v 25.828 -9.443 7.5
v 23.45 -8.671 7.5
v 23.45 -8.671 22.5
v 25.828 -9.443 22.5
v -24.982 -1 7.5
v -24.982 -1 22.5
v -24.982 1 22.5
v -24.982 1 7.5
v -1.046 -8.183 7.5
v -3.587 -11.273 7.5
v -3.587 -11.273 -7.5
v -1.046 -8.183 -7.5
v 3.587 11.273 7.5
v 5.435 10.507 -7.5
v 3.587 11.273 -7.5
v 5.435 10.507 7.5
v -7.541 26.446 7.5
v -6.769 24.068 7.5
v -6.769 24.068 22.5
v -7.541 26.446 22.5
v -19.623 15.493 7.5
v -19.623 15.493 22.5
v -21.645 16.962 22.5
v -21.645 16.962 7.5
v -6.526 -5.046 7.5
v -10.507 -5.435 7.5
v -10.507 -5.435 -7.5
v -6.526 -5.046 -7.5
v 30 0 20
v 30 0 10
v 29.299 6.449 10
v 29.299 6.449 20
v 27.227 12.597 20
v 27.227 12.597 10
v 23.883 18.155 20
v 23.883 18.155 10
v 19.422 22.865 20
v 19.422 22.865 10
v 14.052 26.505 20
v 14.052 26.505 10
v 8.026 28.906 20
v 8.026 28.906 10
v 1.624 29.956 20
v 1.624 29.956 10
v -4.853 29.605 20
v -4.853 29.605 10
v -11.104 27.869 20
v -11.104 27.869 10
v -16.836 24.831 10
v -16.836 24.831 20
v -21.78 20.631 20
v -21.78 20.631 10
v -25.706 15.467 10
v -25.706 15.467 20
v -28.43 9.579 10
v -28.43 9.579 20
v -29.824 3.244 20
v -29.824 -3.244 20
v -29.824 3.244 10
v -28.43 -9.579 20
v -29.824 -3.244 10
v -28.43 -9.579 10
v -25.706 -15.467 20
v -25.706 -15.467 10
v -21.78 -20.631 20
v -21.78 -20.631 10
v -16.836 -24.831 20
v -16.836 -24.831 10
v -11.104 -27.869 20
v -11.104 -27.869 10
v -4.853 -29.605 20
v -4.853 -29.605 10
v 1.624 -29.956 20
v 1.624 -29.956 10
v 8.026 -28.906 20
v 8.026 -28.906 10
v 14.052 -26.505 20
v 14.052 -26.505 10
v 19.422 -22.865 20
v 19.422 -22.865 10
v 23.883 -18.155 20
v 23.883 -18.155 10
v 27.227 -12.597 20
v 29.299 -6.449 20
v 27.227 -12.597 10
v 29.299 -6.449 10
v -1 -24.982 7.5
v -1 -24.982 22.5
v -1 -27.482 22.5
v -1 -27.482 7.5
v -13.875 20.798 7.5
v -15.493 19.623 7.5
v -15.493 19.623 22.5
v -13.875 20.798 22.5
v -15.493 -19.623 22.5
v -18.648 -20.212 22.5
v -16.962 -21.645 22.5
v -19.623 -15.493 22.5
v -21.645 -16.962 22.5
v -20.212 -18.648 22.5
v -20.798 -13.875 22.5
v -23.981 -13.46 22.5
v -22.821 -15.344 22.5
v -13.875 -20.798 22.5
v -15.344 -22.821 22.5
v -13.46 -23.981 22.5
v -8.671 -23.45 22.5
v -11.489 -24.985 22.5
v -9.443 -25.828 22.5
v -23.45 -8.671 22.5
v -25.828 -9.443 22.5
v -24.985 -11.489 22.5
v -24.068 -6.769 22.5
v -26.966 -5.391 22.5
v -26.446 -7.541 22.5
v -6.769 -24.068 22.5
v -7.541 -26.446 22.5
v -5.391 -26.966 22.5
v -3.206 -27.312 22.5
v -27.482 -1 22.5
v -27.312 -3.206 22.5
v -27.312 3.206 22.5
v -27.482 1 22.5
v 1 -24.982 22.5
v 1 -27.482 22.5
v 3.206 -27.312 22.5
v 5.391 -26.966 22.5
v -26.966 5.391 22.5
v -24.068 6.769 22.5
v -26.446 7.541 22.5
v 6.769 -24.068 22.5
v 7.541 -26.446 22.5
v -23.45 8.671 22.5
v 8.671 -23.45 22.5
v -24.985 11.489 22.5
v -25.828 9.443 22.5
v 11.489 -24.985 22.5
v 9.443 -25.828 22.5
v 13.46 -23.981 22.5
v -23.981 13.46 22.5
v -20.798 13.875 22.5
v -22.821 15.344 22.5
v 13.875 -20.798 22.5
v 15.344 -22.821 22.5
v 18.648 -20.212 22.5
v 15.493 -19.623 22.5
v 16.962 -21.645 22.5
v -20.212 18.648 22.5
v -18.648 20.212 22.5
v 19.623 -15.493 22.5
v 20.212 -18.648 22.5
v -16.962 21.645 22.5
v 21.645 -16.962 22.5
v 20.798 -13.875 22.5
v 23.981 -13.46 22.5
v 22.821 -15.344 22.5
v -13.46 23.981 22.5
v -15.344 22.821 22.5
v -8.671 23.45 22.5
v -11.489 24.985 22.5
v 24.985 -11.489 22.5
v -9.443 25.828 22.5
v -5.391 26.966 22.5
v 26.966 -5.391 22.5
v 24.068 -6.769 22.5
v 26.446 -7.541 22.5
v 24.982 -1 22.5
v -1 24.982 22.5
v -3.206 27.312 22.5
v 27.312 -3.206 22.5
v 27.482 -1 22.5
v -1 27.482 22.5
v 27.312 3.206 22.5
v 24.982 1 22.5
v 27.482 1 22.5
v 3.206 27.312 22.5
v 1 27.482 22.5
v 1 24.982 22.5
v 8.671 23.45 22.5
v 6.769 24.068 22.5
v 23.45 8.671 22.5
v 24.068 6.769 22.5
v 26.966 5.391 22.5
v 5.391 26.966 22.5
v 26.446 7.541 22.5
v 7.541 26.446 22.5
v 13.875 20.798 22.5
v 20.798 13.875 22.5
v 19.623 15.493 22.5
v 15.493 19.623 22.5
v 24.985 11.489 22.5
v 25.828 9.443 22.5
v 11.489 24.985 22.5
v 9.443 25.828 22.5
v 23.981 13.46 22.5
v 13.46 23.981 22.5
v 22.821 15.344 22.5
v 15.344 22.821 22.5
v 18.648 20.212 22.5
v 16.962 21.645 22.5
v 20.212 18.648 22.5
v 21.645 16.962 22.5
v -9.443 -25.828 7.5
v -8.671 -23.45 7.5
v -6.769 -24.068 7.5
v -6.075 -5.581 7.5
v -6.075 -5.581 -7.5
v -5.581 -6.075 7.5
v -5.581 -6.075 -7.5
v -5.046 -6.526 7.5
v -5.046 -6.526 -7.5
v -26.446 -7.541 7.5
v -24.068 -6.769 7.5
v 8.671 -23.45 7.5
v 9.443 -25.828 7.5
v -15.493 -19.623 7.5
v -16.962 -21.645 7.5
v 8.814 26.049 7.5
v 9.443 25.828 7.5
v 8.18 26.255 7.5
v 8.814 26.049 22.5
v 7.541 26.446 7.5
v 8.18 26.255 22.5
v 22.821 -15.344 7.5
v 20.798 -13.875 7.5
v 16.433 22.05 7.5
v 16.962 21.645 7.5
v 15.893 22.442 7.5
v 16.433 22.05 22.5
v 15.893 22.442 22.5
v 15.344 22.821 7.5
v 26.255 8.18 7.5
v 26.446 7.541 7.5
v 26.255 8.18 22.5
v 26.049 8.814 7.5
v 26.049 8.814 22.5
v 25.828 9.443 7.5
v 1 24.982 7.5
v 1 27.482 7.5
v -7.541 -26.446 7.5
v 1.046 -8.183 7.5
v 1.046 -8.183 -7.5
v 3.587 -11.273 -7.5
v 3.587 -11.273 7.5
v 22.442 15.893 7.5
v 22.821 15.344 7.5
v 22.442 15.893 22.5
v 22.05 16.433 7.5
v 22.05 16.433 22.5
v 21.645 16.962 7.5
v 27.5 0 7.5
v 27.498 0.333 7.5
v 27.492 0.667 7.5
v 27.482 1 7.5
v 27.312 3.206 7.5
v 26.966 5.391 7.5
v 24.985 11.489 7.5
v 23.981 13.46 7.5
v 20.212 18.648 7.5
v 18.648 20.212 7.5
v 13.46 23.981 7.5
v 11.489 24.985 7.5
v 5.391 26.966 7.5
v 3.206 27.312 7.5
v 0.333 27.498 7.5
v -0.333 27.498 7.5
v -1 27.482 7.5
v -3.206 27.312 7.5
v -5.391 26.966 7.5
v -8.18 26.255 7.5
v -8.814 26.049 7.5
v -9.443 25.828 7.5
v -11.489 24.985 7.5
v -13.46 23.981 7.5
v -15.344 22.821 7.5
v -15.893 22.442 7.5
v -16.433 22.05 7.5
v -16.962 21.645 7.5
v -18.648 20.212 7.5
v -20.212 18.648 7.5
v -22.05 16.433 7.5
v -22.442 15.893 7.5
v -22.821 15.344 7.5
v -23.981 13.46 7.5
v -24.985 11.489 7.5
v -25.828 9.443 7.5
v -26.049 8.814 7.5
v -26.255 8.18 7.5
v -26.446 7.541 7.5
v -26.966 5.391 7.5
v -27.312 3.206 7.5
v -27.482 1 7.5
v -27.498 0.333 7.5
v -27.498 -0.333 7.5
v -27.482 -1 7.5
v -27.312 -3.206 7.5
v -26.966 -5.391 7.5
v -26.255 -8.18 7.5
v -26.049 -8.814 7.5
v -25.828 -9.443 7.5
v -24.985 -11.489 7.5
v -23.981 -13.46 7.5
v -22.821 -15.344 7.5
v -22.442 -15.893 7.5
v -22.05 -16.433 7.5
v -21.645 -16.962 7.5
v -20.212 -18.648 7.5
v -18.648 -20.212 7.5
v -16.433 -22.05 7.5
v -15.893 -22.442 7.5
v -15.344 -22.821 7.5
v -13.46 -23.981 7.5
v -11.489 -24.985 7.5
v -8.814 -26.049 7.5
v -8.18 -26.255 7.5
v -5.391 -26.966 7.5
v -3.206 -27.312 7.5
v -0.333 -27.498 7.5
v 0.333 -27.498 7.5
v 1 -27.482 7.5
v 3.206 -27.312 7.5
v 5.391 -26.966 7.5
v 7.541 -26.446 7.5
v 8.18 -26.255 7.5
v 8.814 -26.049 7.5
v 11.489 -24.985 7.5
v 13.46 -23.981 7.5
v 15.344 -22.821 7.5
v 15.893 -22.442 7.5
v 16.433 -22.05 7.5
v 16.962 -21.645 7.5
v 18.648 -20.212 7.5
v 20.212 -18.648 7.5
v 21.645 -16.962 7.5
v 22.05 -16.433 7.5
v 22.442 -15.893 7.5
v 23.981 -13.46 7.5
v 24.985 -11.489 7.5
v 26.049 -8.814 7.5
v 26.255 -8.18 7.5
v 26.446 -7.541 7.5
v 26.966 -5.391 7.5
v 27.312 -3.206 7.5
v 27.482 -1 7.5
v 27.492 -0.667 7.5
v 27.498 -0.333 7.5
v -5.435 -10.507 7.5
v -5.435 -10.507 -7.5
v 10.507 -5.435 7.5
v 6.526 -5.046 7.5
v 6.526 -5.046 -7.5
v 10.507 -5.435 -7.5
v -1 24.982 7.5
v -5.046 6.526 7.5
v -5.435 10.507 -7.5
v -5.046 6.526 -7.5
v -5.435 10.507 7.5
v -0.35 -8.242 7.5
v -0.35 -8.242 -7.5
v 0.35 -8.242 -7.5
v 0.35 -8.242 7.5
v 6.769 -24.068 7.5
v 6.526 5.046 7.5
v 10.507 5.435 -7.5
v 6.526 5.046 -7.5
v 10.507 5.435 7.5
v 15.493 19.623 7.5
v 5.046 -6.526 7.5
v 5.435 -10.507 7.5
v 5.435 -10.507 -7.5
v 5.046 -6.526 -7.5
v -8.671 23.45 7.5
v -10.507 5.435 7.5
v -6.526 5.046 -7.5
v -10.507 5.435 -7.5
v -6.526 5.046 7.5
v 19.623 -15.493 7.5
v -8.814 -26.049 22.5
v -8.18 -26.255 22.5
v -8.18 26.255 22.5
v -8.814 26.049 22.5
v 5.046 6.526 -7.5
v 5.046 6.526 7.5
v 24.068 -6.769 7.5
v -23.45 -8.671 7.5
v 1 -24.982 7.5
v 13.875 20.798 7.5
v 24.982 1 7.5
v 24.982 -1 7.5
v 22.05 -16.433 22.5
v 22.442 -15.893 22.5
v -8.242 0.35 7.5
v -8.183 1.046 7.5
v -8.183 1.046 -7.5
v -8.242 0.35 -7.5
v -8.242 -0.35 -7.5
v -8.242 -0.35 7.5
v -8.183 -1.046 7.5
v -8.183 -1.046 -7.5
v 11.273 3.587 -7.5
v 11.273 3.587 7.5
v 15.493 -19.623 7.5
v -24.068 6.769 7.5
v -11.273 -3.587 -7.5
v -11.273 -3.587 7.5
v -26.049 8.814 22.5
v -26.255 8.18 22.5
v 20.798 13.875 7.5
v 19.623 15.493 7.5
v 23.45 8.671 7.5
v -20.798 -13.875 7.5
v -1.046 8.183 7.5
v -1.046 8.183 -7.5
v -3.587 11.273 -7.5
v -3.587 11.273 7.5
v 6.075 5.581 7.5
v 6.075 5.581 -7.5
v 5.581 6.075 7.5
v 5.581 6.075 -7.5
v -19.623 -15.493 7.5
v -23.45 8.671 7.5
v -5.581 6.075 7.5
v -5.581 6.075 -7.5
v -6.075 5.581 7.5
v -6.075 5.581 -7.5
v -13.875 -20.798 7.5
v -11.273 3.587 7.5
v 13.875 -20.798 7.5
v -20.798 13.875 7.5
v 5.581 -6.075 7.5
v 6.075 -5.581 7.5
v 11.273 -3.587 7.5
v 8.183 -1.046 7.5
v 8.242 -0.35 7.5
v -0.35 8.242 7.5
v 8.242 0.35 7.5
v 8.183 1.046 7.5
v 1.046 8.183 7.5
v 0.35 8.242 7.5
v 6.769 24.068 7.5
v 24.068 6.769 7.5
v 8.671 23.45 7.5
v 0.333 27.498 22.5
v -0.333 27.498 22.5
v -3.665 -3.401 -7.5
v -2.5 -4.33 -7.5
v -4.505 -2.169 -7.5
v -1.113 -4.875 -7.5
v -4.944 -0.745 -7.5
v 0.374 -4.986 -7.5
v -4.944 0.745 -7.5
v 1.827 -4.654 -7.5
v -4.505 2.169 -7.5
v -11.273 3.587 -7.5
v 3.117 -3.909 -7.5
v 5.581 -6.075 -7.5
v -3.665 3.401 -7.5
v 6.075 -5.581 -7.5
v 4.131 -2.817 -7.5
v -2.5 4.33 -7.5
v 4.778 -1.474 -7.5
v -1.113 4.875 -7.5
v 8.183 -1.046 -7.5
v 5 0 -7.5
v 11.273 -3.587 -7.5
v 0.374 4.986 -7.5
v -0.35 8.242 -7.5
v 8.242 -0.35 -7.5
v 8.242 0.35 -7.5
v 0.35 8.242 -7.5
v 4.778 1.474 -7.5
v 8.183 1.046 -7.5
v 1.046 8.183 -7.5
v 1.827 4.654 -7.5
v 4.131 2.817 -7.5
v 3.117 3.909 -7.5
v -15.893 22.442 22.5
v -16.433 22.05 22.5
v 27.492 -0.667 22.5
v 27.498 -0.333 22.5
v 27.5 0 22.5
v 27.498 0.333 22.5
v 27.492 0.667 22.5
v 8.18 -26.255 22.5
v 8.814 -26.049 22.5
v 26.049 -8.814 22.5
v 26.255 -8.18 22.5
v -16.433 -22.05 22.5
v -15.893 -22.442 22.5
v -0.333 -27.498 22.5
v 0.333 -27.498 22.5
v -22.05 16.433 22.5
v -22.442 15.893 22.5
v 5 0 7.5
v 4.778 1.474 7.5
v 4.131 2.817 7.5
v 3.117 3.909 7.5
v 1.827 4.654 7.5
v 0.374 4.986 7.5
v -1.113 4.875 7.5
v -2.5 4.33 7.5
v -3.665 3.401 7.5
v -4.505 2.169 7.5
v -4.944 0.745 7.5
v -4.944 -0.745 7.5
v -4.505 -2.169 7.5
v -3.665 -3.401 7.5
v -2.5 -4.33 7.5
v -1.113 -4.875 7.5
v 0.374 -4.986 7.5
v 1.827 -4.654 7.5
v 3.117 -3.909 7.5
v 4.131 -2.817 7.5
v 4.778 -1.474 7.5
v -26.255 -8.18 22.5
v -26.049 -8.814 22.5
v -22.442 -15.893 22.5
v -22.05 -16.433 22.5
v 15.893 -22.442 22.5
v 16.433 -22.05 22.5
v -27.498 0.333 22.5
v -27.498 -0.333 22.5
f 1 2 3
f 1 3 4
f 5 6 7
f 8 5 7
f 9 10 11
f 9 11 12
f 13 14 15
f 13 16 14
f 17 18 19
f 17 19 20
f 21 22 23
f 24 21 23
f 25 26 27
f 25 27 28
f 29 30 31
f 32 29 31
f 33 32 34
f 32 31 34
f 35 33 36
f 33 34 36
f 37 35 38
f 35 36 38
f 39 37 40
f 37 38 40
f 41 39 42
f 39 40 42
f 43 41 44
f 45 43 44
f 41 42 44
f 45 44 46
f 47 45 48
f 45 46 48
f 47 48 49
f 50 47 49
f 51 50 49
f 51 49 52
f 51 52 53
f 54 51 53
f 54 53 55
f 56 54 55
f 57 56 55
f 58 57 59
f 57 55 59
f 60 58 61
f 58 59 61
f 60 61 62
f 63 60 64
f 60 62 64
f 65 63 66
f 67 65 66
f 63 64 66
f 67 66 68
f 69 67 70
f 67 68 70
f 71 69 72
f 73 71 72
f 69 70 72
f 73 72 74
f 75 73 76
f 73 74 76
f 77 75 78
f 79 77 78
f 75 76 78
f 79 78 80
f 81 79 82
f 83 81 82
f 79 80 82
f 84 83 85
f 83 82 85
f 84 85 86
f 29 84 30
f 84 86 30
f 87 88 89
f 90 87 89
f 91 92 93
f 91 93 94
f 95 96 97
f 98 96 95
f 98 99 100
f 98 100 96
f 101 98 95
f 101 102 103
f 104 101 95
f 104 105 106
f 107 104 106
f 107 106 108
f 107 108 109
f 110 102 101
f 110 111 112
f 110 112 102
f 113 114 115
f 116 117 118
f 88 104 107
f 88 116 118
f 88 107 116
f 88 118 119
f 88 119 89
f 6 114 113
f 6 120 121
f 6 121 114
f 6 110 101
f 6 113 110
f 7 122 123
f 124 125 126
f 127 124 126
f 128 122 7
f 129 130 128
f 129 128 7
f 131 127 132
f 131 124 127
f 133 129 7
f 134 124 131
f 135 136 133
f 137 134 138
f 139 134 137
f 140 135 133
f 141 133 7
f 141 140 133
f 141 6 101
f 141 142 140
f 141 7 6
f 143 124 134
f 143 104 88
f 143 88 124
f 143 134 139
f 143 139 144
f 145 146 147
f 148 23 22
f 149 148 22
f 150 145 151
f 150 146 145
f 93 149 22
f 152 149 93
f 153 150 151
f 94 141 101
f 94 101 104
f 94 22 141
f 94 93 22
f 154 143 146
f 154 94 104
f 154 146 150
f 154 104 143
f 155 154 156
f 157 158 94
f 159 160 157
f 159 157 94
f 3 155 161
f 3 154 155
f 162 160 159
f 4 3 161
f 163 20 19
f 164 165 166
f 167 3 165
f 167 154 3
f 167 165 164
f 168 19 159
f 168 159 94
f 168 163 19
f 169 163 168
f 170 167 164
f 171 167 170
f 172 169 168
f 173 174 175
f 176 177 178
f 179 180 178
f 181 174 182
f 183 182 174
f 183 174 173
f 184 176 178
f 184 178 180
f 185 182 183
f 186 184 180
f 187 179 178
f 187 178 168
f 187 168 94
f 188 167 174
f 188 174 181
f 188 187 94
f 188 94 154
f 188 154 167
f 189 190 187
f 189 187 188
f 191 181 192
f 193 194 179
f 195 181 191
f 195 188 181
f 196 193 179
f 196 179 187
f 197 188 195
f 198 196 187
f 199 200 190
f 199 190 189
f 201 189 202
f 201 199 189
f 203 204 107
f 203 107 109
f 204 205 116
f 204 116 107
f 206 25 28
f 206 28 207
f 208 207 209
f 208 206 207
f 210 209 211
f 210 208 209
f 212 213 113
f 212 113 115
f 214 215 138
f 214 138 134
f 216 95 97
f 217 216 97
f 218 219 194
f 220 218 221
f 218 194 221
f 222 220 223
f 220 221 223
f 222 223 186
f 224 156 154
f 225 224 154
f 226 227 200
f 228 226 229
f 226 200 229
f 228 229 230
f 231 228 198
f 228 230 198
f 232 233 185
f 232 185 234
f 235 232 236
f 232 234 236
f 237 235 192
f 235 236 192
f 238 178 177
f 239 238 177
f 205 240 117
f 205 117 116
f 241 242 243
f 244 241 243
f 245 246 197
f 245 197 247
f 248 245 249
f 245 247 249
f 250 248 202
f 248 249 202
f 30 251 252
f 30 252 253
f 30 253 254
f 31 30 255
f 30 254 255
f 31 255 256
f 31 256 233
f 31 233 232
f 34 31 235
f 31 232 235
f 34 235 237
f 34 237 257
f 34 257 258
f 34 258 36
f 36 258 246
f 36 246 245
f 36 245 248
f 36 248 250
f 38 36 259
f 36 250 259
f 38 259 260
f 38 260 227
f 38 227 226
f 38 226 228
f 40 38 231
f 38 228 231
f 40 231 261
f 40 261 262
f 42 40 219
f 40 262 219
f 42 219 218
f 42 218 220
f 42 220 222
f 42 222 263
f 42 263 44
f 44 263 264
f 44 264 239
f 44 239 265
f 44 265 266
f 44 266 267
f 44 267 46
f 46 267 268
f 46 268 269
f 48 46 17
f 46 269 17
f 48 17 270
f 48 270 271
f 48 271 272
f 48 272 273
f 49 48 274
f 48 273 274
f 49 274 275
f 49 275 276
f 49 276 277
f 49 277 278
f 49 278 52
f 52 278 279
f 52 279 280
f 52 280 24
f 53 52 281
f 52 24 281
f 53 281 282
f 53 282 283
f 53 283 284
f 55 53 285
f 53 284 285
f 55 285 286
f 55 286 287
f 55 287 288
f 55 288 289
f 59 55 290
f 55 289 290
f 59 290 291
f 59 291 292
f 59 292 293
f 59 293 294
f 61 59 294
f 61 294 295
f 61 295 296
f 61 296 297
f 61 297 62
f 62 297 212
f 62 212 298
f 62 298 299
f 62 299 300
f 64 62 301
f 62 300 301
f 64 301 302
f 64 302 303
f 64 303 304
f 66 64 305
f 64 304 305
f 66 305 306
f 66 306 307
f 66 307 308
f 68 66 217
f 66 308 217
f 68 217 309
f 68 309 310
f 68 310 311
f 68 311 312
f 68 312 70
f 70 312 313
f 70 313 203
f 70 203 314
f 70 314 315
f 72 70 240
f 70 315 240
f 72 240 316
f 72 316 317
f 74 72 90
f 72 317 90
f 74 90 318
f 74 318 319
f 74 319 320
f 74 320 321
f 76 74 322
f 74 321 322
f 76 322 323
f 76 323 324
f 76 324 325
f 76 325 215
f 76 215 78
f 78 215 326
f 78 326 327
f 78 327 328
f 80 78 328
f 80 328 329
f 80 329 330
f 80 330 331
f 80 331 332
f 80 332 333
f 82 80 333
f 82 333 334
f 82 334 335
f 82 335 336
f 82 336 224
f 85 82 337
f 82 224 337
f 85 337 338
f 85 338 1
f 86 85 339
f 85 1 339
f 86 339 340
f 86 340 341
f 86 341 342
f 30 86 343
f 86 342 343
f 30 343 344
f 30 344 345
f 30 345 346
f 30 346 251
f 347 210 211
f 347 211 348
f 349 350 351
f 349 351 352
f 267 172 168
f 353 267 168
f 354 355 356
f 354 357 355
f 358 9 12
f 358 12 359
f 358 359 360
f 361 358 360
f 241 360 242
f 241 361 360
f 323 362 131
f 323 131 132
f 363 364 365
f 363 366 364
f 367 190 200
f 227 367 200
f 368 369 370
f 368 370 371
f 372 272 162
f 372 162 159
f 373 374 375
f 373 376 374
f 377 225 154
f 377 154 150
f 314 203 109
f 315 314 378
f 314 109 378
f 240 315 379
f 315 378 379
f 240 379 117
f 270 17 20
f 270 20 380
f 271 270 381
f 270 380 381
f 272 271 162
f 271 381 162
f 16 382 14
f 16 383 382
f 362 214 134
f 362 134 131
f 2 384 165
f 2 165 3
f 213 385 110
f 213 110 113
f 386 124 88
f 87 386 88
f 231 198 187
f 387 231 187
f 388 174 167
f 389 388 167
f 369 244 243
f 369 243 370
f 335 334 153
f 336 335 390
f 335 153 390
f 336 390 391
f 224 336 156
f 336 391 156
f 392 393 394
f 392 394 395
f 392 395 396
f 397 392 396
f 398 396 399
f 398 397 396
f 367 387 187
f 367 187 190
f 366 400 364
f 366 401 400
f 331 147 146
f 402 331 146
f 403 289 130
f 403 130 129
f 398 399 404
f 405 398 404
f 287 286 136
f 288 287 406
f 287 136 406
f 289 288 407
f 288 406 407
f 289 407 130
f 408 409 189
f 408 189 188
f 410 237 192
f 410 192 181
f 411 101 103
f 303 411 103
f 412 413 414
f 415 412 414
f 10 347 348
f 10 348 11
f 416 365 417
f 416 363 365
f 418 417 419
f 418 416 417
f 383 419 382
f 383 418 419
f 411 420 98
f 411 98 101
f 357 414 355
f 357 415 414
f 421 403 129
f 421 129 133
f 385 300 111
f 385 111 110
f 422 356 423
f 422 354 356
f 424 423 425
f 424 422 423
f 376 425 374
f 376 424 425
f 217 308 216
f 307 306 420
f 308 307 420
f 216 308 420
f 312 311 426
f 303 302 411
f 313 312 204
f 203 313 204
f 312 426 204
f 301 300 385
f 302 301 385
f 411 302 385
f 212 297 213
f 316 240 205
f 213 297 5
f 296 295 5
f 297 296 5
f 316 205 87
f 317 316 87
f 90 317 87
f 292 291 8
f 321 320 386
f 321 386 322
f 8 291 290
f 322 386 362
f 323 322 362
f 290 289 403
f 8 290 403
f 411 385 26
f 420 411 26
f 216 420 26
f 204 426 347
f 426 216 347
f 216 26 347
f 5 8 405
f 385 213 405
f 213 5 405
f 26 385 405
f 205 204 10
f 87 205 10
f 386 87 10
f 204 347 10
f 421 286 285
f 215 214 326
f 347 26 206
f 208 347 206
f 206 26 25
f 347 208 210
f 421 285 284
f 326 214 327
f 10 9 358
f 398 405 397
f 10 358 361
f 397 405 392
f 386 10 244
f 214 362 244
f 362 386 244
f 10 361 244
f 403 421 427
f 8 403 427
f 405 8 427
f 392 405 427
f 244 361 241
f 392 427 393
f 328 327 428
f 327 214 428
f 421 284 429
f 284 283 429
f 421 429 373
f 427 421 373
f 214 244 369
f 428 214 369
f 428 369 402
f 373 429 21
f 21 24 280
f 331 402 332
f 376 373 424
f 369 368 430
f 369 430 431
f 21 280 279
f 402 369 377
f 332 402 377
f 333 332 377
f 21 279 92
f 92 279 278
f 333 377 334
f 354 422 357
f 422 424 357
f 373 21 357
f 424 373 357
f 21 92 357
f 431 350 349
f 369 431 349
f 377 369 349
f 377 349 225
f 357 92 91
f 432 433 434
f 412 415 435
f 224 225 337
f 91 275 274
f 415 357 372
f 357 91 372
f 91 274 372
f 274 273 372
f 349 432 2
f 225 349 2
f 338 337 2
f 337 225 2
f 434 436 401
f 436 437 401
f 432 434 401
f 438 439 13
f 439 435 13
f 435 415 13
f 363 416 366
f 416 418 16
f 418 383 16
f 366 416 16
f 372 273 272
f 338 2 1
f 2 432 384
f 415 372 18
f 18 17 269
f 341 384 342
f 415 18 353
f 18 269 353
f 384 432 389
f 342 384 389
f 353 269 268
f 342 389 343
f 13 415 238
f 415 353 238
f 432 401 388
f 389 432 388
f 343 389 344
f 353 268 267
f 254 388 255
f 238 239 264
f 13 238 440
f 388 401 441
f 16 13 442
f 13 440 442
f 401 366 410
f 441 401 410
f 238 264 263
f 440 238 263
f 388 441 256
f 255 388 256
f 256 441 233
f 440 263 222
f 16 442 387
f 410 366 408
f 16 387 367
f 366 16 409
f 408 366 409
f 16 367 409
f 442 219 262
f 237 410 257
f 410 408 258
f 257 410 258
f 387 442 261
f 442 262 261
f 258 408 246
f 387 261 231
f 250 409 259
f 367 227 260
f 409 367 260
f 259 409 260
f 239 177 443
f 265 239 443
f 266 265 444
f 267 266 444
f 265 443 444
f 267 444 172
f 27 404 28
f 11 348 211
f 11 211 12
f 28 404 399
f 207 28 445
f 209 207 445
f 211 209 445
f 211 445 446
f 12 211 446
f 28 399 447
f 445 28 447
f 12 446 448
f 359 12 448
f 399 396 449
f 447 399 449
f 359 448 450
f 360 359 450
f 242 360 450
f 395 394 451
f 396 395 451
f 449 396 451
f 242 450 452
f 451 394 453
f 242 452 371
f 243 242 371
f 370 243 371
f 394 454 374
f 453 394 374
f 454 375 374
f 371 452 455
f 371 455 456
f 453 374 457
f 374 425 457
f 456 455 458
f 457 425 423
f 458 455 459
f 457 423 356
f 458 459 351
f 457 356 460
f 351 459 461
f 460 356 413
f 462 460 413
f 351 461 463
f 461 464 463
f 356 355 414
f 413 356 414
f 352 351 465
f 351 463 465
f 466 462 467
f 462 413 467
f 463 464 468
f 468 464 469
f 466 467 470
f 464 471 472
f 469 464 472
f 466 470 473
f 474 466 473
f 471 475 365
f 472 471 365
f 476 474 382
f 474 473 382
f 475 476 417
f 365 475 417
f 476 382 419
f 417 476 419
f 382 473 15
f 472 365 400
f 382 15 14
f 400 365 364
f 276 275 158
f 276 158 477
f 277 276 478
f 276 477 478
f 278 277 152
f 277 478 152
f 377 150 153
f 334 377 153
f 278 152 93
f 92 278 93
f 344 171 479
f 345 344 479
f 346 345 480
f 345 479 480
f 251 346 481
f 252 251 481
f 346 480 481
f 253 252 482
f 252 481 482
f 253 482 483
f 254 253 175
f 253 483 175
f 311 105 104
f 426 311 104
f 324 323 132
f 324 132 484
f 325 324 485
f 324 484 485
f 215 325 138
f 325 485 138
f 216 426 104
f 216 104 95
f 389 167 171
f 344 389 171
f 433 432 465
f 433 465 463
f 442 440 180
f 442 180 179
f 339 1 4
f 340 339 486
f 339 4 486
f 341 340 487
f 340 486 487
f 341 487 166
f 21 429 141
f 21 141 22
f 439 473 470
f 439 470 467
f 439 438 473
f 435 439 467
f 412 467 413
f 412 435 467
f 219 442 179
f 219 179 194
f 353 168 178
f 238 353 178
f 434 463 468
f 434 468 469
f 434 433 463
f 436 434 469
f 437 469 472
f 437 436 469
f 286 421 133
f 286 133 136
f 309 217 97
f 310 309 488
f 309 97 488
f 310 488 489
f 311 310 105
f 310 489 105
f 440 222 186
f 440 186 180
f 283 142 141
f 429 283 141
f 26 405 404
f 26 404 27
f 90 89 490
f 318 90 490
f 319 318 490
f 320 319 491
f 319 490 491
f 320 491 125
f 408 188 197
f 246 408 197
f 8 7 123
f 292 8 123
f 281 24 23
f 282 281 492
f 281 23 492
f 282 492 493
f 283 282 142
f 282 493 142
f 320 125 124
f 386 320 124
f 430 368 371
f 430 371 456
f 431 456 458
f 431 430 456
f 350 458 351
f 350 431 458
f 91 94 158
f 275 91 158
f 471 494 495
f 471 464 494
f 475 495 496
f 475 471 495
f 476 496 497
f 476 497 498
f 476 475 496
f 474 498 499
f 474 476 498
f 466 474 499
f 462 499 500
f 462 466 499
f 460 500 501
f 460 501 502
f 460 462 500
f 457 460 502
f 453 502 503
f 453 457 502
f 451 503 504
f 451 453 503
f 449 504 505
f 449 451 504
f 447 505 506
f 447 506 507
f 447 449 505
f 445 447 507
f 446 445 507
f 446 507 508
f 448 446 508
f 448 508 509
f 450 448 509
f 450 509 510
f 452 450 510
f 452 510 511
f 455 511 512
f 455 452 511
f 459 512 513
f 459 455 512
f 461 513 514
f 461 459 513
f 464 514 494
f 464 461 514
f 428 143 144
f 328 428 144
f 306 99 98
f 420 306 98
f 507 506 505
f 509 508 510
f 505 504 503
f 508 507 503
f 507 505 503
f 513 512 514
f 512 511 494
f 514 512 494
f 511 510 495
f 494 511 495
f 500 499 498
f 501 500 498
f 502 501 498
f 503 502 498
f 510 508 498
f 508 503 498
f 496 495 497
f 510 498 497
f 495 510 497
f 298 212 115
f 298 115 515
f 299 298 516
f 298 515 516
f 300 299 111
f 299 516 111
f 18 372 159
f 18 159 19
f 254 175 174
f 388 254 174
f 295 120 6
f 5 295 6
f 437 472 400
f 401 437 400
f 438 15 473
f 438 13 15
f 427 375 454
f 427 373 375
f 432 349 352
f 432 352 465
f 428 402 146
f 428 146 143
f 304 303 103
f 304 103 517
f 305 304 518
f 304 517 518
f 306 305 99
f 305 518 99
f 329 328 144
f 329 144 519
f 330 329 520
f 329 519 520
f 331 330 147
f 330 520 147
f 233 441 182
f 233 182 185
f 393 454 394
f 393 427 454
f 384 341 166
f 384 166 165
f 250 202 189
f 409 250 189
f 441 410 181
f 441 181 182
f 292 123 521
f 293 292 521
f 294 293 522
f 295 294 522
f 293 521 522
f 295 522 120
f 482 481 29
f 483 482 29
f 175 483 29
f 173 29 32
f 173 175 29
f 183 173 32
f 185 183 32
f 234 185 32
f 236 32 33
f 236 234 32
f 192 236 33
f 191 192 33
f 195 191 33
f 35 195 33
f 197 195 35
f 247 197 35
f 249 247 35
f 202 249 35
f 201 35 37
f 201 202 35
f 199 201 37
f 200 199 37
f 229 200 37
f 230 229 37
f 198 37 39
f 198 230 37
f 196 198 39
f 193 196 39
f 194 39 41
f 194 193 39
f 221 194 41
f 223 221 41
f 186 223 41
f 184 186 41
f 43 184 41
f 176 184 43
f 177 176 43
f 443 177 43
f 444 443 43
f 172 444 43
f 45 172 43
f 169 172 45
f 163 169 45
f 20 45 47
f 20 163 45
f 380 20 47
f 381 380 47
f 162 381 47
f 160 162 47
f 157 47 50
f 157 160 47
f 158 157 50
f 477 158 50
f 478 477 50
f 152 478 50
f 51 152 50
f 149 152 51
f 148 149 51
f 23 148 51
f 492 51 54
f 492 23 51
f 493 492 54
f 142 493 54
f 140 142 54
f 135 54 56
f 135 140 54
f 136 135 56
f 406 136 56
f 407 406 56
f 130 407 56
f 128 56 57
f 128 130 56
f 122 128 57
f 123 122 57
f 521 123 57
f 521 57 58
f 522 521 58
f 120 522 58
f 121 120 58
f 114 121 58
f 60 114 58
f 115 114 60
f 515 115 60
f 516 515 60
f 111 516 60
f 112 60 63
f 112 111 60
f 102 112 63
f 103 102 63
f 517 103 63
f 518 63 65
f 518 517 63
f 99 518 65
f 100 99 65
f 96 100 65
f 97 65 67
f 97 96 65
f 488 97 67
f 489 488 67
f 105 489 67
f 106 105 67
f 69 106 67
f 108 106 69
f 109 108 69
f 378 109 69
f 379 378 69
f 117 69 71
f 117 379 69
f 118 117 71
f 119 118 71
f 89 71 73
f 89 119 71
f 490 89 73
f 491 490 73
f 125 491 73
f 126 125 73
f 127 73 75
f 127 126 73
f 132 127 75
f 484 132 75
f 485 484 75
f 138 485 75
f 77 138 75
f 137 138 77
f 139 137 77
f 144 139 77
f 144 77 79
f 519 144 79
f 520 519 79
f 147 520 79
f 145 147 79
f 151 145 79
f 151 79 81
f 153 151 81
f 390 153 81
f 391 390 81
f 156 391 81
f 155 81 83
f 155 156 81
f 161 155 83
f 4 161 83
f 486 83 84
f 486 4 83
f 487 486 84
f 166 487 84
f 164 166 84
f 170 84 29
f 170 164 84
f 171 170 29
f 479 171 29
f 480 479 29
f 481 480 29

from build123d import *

# Parameters (mm, degrees)
F0_R     = 5
F1_DEPTH = 7.5
F2_R     = 30
F3_DEPTH = 15
F4_SIZE  = 2.5
F6_DEPTH = 25


with BuildPart() as f1:
    # F0 (on Top) → F1 (new body, symmetric)
    with BuildSketch(Plane.XY):
        with BuildLine():
            Line((-11.2727608123, 3.5869382136), (-8.1831376229, 1.0464208357))
            ThreePointArc((-8.1831376229, 1.0464208357), (-8.249771992, 0), (-8.1831376229, -1.0464208357))
            Line((-8.1831376229, -1.0464208357), (-11.2727608123, -3.5869382136))
            Line((-11.2727608123, -3.5869382136), (-10.5073939476, -5.4346972786))
            Line((-10.5073939476, -5.4346972786), (-6.5262833734, -5.0464208357))
            ThreePointArc((-6.5262833734, -5.0464208357), (-5.8334697188, -5.8334697188), (-5.0464208357, -6.5262833734))
            Line((-5.0464208357, -6.5262833734), (-5.4346972786, -10.5073939476))
            Line((-5.4346972786, -10.5073939476), (-3.5869382136, -11.2727608123))
            Line((-3.5869382136, -11.2727608123), (-1.0464208357, -8.1831376229))
            ThreePointArc((-1.0464208357, -8.1831376229), (0, -8.249771992), (1.0464208357, -8.1831376229))
            Line((1.0464208357, -8.1831376229), (3.5869382136, -11.2727608123))
            Line((3.5869382136, -11.2727608123), (5.4346972786, -10.5073939476))
            Line((5.4346972786, -10.5073939476), (5.0464208357, -6.5262833734))
            ThreePointArc((5.0464208357, -6.5262833734), (5.8334697188, -5.8334697188), (6.5262833734, -5.0464208357))
            Line((6.5262833734, -5.0464208357), (10.5073939476, -5.4346972786))
            Line((10.5073939476, -5.4346972786), (11.2727608123, -3.5869382136))
            Line((11.2727608123, -3.5869382136), (8.1831376229, -1.0464208357))
            ThreePointArc((8.1831376229, -1.0464208357), (8.249771992, 0), (8.1831376229, 1.0464208357))
            Line((8.1831376229, 1.0464208357), (11.2727608123, 3.5869382136))
            Line((11.2727608123, 3.5869382136), (10.5073939476, 5.4346972786))
            Line((10.5073939476, 5.4346972786), (6.5262833734, 5.0464208357))
            ThreePointArc((6.5262833734, 5.0464208357), (5.8334697188, 5.8334697188), (5.0464208357, 6.5262833734))
            Line((5.0464208357, 6.5262833734), (5.4346972786, 10.5073939476))
            Line((5.4346972786, 10.5073939476), (3.5869382136, 11.2727608123))
            Line((3.5869382136, 11.2727608123), (1.0464208357, 8.1831376229))
            ThreePointArc((1.0464208357, 8.1831376229), (0, 8.249771992), (-1.0464208357, 8.1831376229))
            Line((-1.0464208357, 8.1831376229), (-3.5869382136, 11.2727608123))
            Line((-3.5869382136, 11.2727608123), (-5.4346972786, 10.5073939476))
            Line((-5.4346972786, 10.5073939476), (-5.0464208357, 6.5262833734))
            ThreePointArc((-5.0464208357, 6.5262833734), (-5.8334697188, 5.8334697188), (-6.5262833734, 5.0464208357))
            Line((-6.5262833734, 5.0464208357), (-10.5073939476, 5.4346972786))
            Line((-10.5073939476, 5.4346972786), (-11.2727608123, 3.5869382136))
        make_face()
        Circle(F0_R, mode=Mode.SUBTRACT)
    extrude(amount=F1_DEPTH, both=True)

    # F2 (on face) → F3 (join)
    with BuildSketch(Plane.XY.offset(7.5)):
        Circle(F2_R)
    extrude(amount=F3_DEPTH)

    # F4
    f4_edges = [f1.edges().sort_by_distance(p)[0] for p in [
        (-30, 0, 22.5),
        (-30, 0, 7.5),
    ]]
    chamfer(f4_edges, length=F4_SIZE)

    # F5 (on face) → F6 (cut)
    with BuildSketch(Plane.XY.offset(22.5)):
        with BuildLine():
            Line((-1, 24.9818121673), (1, 24.9818121673))
            Line((1, 24.9818121673), (1, 27.4818121673))
            ThreePointArc((1, 27.4818121673), (0, 27.5), (-1, 27.4818121673))
            Line((-1, 27.4818121673), (-1, 24.9818121673))
        make_face()
        with BuildLine():
            ThreePointArc((-7.5412904796, 26.4457735357), (-8.4979673453, 26.1540541981), (-9.4434035122, 25.827739547))
            Line((-9.4434035122, 25.827739547), (-8.6708610263, 23.4500982562))
            Line((-8.6708610263, 23.4500982562), (-6.7687479937, 24.068132245))
            Line((-6.7687479937, 24.068132245), (-7.5412904796, 26.4457735357))
        make_face()
        with BuildLine():
            ThreePointArc((-15.3443869038, 22.8210383319), (-16.164094438, 22.2479673453), (-16.9624208926, 21.6454678273))
            Line((-16.9624208926, 21.6454678273), (-15.4929577619, 19.6229253414))
            Line((-15.4929577619, 19.6229253414), (-13.8749237731, 20.7984958459))
            Line((-13.8749237731, 20.7984958459), (-15.3443869038, 22.8210383319))
        make_face()
        with BuildLine():
            ThreePointArc((-21.6454678273, 16.9624208926), (-22.2479673453, 16.164094438), (-22.8210383319, 15.3443869038))
            Line((-22.8210383319, 15.3443869038), (-20.7984958459, 13.8749237731))
            Line((-20.7984958459, 13.8749237731), (-19.6229253414, 15.4929577619))
            Line((-19.6229253414, 15.4929577619), (-21.6454678273, 16.9624208926))
        make_face()
        with BuildLine():
            ThreePointArc((-25.827739547, 9.4434035122), (-26.1540541981, 8.4979673453), (-26.4457735357, 7.5412904796))
            Line((-26.4457735357, 7.5412904796), (-24.068132245, 6.7687479937))
            Line((-24.068132245, 6.7687479937), (-23.4500982562, 8.6708610263))
            Line((-23.4500982562, 8.6708610263), (-25.827739547, 9.4434035122))
        make_face()
        with BuildLine():
            ThreePointArc((-27.4818121673, 1), (-27.5, 0), (-27.4818121673, -1))
            Line((-27.4818121673, -1), (-24.9818121673, -1))
            Line((-24.9818121673, -1), (-24.9818121673, 1))
            Line((-24.9818121673, 1), (-27.4818121673, 1))
        make_face()
        with BuildLine():
            ThreePointArc((-26.4457735357, -7.5412904796), (-26.1540541981, -8.4979673453), (-25.827739547, -9.4434035122))
            Line((-25.827739547, -9.4434035122), (-23.4500982562, -8.6708610263))
            Line((-23.4500982562, -8.6708610263), (-24.068132245, -6.7687479937))
            Line((-24.068132245, -6.7687479937), (-26.4457735357, -7.5412904796))
        make_face()
        with BuildLine():
            ThreePointArc((-22.8210383319, -15.3443869038), (-22.2479673453, -16.164094438), (-21.6454678273, -16.9624208926))
            Line((-21.6454678273, -16.9624208926), (-19.6229253414, -15.4929577619))
            Line((-19.6229253414, -15.4929577619), (-20.7984958459, -13.8749237731))
            Line((-20.7984958459, -13.8749237731), (-22.8210383319, -15.3443869038))
        make_face()
        with BuildLine():
            ThreePointArc((-16.9624208926, -21.6454678273), (-16.164094438, -22.2479673453), (-15.3443869038, -22.8210383319))
            Line((-15.3443869038, -22.8210383319), (-13.8749237731, -20.7984958459))
            Line((-13.8749237731, -20.7984958459), (-15.4929577619, -19.6229253414))
            Line((-15.4929577619, -19.6229253414), (-16.9624208926, -21.6454678273))
        make_face()
        with BuildLine():
            ThreePointArc((-9.4434035122, -25.827739547), (-8.4979673453, -26.1540541981), (-7.5412904796, -26.4457735357))
            Line((-7.5412904796, -26.4457735357), (-6.7687479937, -24.068132245))
            Line((-6.7687479937, -24.068132245), (-8.6708610263, -23.4500982562))
            Line((-8.6708610263, -23.4500982562), (-9.4434035122, -25.827739547))
        make_face()
        with BuildLine():
            ThreePointArc((-1, -27.4818121673), (0, -27.5), (1, -27.4818121673))
            Line((1, -27.4818121673), (1, -24.9818121673))
            Line((1, -24.9818121673), (-1, -24.9818121673))
            Line((-1, -24.9818121673), (-1, -27.4818121673))
        make_face()
        with BuildLine():
            ThreePointArc((7.5412904796, -26.4457735357), (8.4979673453, -26.1540541981), (9.4434035122, -25.827739547))
            Line((9.4434035122, -25.827739547), (8.6708610263, -23.4500982562))
            Line((8.6708610263, -23.4500982562), (6.7687479937, -24.068132245))
            Line((6.7687479937, -24.068132245), (7.5412904796, -26.4457735357))
        make_face()
        with BuildLine():
            ThreePointArc((15.3443869038, -22.8210383319), (16.164094438, -22.2479673453), (16.9624208926, -21.6454678273))
            Line((16.9624208926, -21.6454678273), (15.4929577619, -19.6229253414))
            Line((15.4929577619, -19.6229253414), (13.8749237731, -20.7984958459))
            Line((13.8749237731, -20.7984958459), (15.3443869038, -22.8210383319))
        make_face()
        with BuildLine():
            ThreePointArc((21.6454678273, -16.9624208926), (22.2479673453, -16.164094438), (22.8210383319, -15.3443869038))
            Line((22.8210383319, -15.3443869038), (20.7984958459, -13.8749237731))
            Line((20.7984958459, -13.8749237731), (19.6229253414, -15.4929577619))
            Line((19.6229253414, -15.4929577619), (21.6454678273, -16.9624208926))
        make_face()
        with BuildLine():
            ThreePointArc((25.827739547, -9.4434035122), (26.1540541981, -8.4979673453), (26.4457735357, -7.5412904796))
            Line((26.4457735357, -7.5412904796), (24.068132245, -6.7687479937))
            Line((24.068132245, -6.7687479937), (23.4500982562, -8.6708610263))
            Line((23.4500982562, -8.6708610263), (25.827739547, -9.4434035122))
        make_face()
        with BuildLine():
            ThreePointArc((27.4818121673, -1), (27.5, 0), (27.4818121673, 1))
            Line((27.4818121673, 1), (24.9818121673, 1))
            Line((24.9818121673, 1), (24.9818121673, -1))
            Line((24.9818121673, -1), (27.4818121673, -1))
        make_face()
        with BuildLine():
            ThreePointArc((26.4457735357, 7.5412904796), (26.1540541981, 8.4979673453), (25.827739547, 9.4434035122))
            Line((25.827739547, 9.4434035122), (23.4500982562, 8.6708610263))
            Line((23.4500982562, 8.6708610263), (24.068132245, 6.7687479937))
            Line((24.068132245, 6.7687479937), (26.4457735357, 7.5412904796))
        make_face()
        with BuildLine():
            ThreePointArc((22.8210383319, 15.3443869038), (22.2479673453, 16.164094438), (21.6454678273, 16.9624208926))
            Line((21.6454678273, 16.9624208926), (19.6229253414, 15.4929577619))
            Line((19.6229253414, 15.4929577619), (20.7984958459, 13.8749237731))
            Line((20.7984958459, 13.8749237731), (22.8210383319, 15.3443869038))
        make_face()
        with BuildLine():
            ThreePointArc((16.9624208926, 21.6454678273), (16.164094438, 22.2479673453), (15.3443869038, 22.8210383319))
            Line((15.3443869038, 22.8210383319), (13.8749237731, 20.7984958459))
            Line((13.8749237731, 20.7984958459), (15.4929577619, 19.6229253414))
            Line((15.4929577619, 19.6229253414), (16.9624208926, 21.6454678273))
        make_face()
        with BuildLine():
            ThreePointArc((9.4434035122, 25.827739547), (8.4979673453, 26.1540541981), (7.5412904796, 26.4457735357))
            Line((7.5412904796, 26.4457735357), (6.7687479937, 24.068132245))
            Line((6.7687479937, 24.068132245), (8.6708610263, 23.4500982562))
            Line((8.6708610263, 23.4500982562), (9.4434035122, 25.827739547))
        make_face()
    extrude(amount=-F6_DEPTH, mode=Mode.SUBTRACT)


solid = f1.part
